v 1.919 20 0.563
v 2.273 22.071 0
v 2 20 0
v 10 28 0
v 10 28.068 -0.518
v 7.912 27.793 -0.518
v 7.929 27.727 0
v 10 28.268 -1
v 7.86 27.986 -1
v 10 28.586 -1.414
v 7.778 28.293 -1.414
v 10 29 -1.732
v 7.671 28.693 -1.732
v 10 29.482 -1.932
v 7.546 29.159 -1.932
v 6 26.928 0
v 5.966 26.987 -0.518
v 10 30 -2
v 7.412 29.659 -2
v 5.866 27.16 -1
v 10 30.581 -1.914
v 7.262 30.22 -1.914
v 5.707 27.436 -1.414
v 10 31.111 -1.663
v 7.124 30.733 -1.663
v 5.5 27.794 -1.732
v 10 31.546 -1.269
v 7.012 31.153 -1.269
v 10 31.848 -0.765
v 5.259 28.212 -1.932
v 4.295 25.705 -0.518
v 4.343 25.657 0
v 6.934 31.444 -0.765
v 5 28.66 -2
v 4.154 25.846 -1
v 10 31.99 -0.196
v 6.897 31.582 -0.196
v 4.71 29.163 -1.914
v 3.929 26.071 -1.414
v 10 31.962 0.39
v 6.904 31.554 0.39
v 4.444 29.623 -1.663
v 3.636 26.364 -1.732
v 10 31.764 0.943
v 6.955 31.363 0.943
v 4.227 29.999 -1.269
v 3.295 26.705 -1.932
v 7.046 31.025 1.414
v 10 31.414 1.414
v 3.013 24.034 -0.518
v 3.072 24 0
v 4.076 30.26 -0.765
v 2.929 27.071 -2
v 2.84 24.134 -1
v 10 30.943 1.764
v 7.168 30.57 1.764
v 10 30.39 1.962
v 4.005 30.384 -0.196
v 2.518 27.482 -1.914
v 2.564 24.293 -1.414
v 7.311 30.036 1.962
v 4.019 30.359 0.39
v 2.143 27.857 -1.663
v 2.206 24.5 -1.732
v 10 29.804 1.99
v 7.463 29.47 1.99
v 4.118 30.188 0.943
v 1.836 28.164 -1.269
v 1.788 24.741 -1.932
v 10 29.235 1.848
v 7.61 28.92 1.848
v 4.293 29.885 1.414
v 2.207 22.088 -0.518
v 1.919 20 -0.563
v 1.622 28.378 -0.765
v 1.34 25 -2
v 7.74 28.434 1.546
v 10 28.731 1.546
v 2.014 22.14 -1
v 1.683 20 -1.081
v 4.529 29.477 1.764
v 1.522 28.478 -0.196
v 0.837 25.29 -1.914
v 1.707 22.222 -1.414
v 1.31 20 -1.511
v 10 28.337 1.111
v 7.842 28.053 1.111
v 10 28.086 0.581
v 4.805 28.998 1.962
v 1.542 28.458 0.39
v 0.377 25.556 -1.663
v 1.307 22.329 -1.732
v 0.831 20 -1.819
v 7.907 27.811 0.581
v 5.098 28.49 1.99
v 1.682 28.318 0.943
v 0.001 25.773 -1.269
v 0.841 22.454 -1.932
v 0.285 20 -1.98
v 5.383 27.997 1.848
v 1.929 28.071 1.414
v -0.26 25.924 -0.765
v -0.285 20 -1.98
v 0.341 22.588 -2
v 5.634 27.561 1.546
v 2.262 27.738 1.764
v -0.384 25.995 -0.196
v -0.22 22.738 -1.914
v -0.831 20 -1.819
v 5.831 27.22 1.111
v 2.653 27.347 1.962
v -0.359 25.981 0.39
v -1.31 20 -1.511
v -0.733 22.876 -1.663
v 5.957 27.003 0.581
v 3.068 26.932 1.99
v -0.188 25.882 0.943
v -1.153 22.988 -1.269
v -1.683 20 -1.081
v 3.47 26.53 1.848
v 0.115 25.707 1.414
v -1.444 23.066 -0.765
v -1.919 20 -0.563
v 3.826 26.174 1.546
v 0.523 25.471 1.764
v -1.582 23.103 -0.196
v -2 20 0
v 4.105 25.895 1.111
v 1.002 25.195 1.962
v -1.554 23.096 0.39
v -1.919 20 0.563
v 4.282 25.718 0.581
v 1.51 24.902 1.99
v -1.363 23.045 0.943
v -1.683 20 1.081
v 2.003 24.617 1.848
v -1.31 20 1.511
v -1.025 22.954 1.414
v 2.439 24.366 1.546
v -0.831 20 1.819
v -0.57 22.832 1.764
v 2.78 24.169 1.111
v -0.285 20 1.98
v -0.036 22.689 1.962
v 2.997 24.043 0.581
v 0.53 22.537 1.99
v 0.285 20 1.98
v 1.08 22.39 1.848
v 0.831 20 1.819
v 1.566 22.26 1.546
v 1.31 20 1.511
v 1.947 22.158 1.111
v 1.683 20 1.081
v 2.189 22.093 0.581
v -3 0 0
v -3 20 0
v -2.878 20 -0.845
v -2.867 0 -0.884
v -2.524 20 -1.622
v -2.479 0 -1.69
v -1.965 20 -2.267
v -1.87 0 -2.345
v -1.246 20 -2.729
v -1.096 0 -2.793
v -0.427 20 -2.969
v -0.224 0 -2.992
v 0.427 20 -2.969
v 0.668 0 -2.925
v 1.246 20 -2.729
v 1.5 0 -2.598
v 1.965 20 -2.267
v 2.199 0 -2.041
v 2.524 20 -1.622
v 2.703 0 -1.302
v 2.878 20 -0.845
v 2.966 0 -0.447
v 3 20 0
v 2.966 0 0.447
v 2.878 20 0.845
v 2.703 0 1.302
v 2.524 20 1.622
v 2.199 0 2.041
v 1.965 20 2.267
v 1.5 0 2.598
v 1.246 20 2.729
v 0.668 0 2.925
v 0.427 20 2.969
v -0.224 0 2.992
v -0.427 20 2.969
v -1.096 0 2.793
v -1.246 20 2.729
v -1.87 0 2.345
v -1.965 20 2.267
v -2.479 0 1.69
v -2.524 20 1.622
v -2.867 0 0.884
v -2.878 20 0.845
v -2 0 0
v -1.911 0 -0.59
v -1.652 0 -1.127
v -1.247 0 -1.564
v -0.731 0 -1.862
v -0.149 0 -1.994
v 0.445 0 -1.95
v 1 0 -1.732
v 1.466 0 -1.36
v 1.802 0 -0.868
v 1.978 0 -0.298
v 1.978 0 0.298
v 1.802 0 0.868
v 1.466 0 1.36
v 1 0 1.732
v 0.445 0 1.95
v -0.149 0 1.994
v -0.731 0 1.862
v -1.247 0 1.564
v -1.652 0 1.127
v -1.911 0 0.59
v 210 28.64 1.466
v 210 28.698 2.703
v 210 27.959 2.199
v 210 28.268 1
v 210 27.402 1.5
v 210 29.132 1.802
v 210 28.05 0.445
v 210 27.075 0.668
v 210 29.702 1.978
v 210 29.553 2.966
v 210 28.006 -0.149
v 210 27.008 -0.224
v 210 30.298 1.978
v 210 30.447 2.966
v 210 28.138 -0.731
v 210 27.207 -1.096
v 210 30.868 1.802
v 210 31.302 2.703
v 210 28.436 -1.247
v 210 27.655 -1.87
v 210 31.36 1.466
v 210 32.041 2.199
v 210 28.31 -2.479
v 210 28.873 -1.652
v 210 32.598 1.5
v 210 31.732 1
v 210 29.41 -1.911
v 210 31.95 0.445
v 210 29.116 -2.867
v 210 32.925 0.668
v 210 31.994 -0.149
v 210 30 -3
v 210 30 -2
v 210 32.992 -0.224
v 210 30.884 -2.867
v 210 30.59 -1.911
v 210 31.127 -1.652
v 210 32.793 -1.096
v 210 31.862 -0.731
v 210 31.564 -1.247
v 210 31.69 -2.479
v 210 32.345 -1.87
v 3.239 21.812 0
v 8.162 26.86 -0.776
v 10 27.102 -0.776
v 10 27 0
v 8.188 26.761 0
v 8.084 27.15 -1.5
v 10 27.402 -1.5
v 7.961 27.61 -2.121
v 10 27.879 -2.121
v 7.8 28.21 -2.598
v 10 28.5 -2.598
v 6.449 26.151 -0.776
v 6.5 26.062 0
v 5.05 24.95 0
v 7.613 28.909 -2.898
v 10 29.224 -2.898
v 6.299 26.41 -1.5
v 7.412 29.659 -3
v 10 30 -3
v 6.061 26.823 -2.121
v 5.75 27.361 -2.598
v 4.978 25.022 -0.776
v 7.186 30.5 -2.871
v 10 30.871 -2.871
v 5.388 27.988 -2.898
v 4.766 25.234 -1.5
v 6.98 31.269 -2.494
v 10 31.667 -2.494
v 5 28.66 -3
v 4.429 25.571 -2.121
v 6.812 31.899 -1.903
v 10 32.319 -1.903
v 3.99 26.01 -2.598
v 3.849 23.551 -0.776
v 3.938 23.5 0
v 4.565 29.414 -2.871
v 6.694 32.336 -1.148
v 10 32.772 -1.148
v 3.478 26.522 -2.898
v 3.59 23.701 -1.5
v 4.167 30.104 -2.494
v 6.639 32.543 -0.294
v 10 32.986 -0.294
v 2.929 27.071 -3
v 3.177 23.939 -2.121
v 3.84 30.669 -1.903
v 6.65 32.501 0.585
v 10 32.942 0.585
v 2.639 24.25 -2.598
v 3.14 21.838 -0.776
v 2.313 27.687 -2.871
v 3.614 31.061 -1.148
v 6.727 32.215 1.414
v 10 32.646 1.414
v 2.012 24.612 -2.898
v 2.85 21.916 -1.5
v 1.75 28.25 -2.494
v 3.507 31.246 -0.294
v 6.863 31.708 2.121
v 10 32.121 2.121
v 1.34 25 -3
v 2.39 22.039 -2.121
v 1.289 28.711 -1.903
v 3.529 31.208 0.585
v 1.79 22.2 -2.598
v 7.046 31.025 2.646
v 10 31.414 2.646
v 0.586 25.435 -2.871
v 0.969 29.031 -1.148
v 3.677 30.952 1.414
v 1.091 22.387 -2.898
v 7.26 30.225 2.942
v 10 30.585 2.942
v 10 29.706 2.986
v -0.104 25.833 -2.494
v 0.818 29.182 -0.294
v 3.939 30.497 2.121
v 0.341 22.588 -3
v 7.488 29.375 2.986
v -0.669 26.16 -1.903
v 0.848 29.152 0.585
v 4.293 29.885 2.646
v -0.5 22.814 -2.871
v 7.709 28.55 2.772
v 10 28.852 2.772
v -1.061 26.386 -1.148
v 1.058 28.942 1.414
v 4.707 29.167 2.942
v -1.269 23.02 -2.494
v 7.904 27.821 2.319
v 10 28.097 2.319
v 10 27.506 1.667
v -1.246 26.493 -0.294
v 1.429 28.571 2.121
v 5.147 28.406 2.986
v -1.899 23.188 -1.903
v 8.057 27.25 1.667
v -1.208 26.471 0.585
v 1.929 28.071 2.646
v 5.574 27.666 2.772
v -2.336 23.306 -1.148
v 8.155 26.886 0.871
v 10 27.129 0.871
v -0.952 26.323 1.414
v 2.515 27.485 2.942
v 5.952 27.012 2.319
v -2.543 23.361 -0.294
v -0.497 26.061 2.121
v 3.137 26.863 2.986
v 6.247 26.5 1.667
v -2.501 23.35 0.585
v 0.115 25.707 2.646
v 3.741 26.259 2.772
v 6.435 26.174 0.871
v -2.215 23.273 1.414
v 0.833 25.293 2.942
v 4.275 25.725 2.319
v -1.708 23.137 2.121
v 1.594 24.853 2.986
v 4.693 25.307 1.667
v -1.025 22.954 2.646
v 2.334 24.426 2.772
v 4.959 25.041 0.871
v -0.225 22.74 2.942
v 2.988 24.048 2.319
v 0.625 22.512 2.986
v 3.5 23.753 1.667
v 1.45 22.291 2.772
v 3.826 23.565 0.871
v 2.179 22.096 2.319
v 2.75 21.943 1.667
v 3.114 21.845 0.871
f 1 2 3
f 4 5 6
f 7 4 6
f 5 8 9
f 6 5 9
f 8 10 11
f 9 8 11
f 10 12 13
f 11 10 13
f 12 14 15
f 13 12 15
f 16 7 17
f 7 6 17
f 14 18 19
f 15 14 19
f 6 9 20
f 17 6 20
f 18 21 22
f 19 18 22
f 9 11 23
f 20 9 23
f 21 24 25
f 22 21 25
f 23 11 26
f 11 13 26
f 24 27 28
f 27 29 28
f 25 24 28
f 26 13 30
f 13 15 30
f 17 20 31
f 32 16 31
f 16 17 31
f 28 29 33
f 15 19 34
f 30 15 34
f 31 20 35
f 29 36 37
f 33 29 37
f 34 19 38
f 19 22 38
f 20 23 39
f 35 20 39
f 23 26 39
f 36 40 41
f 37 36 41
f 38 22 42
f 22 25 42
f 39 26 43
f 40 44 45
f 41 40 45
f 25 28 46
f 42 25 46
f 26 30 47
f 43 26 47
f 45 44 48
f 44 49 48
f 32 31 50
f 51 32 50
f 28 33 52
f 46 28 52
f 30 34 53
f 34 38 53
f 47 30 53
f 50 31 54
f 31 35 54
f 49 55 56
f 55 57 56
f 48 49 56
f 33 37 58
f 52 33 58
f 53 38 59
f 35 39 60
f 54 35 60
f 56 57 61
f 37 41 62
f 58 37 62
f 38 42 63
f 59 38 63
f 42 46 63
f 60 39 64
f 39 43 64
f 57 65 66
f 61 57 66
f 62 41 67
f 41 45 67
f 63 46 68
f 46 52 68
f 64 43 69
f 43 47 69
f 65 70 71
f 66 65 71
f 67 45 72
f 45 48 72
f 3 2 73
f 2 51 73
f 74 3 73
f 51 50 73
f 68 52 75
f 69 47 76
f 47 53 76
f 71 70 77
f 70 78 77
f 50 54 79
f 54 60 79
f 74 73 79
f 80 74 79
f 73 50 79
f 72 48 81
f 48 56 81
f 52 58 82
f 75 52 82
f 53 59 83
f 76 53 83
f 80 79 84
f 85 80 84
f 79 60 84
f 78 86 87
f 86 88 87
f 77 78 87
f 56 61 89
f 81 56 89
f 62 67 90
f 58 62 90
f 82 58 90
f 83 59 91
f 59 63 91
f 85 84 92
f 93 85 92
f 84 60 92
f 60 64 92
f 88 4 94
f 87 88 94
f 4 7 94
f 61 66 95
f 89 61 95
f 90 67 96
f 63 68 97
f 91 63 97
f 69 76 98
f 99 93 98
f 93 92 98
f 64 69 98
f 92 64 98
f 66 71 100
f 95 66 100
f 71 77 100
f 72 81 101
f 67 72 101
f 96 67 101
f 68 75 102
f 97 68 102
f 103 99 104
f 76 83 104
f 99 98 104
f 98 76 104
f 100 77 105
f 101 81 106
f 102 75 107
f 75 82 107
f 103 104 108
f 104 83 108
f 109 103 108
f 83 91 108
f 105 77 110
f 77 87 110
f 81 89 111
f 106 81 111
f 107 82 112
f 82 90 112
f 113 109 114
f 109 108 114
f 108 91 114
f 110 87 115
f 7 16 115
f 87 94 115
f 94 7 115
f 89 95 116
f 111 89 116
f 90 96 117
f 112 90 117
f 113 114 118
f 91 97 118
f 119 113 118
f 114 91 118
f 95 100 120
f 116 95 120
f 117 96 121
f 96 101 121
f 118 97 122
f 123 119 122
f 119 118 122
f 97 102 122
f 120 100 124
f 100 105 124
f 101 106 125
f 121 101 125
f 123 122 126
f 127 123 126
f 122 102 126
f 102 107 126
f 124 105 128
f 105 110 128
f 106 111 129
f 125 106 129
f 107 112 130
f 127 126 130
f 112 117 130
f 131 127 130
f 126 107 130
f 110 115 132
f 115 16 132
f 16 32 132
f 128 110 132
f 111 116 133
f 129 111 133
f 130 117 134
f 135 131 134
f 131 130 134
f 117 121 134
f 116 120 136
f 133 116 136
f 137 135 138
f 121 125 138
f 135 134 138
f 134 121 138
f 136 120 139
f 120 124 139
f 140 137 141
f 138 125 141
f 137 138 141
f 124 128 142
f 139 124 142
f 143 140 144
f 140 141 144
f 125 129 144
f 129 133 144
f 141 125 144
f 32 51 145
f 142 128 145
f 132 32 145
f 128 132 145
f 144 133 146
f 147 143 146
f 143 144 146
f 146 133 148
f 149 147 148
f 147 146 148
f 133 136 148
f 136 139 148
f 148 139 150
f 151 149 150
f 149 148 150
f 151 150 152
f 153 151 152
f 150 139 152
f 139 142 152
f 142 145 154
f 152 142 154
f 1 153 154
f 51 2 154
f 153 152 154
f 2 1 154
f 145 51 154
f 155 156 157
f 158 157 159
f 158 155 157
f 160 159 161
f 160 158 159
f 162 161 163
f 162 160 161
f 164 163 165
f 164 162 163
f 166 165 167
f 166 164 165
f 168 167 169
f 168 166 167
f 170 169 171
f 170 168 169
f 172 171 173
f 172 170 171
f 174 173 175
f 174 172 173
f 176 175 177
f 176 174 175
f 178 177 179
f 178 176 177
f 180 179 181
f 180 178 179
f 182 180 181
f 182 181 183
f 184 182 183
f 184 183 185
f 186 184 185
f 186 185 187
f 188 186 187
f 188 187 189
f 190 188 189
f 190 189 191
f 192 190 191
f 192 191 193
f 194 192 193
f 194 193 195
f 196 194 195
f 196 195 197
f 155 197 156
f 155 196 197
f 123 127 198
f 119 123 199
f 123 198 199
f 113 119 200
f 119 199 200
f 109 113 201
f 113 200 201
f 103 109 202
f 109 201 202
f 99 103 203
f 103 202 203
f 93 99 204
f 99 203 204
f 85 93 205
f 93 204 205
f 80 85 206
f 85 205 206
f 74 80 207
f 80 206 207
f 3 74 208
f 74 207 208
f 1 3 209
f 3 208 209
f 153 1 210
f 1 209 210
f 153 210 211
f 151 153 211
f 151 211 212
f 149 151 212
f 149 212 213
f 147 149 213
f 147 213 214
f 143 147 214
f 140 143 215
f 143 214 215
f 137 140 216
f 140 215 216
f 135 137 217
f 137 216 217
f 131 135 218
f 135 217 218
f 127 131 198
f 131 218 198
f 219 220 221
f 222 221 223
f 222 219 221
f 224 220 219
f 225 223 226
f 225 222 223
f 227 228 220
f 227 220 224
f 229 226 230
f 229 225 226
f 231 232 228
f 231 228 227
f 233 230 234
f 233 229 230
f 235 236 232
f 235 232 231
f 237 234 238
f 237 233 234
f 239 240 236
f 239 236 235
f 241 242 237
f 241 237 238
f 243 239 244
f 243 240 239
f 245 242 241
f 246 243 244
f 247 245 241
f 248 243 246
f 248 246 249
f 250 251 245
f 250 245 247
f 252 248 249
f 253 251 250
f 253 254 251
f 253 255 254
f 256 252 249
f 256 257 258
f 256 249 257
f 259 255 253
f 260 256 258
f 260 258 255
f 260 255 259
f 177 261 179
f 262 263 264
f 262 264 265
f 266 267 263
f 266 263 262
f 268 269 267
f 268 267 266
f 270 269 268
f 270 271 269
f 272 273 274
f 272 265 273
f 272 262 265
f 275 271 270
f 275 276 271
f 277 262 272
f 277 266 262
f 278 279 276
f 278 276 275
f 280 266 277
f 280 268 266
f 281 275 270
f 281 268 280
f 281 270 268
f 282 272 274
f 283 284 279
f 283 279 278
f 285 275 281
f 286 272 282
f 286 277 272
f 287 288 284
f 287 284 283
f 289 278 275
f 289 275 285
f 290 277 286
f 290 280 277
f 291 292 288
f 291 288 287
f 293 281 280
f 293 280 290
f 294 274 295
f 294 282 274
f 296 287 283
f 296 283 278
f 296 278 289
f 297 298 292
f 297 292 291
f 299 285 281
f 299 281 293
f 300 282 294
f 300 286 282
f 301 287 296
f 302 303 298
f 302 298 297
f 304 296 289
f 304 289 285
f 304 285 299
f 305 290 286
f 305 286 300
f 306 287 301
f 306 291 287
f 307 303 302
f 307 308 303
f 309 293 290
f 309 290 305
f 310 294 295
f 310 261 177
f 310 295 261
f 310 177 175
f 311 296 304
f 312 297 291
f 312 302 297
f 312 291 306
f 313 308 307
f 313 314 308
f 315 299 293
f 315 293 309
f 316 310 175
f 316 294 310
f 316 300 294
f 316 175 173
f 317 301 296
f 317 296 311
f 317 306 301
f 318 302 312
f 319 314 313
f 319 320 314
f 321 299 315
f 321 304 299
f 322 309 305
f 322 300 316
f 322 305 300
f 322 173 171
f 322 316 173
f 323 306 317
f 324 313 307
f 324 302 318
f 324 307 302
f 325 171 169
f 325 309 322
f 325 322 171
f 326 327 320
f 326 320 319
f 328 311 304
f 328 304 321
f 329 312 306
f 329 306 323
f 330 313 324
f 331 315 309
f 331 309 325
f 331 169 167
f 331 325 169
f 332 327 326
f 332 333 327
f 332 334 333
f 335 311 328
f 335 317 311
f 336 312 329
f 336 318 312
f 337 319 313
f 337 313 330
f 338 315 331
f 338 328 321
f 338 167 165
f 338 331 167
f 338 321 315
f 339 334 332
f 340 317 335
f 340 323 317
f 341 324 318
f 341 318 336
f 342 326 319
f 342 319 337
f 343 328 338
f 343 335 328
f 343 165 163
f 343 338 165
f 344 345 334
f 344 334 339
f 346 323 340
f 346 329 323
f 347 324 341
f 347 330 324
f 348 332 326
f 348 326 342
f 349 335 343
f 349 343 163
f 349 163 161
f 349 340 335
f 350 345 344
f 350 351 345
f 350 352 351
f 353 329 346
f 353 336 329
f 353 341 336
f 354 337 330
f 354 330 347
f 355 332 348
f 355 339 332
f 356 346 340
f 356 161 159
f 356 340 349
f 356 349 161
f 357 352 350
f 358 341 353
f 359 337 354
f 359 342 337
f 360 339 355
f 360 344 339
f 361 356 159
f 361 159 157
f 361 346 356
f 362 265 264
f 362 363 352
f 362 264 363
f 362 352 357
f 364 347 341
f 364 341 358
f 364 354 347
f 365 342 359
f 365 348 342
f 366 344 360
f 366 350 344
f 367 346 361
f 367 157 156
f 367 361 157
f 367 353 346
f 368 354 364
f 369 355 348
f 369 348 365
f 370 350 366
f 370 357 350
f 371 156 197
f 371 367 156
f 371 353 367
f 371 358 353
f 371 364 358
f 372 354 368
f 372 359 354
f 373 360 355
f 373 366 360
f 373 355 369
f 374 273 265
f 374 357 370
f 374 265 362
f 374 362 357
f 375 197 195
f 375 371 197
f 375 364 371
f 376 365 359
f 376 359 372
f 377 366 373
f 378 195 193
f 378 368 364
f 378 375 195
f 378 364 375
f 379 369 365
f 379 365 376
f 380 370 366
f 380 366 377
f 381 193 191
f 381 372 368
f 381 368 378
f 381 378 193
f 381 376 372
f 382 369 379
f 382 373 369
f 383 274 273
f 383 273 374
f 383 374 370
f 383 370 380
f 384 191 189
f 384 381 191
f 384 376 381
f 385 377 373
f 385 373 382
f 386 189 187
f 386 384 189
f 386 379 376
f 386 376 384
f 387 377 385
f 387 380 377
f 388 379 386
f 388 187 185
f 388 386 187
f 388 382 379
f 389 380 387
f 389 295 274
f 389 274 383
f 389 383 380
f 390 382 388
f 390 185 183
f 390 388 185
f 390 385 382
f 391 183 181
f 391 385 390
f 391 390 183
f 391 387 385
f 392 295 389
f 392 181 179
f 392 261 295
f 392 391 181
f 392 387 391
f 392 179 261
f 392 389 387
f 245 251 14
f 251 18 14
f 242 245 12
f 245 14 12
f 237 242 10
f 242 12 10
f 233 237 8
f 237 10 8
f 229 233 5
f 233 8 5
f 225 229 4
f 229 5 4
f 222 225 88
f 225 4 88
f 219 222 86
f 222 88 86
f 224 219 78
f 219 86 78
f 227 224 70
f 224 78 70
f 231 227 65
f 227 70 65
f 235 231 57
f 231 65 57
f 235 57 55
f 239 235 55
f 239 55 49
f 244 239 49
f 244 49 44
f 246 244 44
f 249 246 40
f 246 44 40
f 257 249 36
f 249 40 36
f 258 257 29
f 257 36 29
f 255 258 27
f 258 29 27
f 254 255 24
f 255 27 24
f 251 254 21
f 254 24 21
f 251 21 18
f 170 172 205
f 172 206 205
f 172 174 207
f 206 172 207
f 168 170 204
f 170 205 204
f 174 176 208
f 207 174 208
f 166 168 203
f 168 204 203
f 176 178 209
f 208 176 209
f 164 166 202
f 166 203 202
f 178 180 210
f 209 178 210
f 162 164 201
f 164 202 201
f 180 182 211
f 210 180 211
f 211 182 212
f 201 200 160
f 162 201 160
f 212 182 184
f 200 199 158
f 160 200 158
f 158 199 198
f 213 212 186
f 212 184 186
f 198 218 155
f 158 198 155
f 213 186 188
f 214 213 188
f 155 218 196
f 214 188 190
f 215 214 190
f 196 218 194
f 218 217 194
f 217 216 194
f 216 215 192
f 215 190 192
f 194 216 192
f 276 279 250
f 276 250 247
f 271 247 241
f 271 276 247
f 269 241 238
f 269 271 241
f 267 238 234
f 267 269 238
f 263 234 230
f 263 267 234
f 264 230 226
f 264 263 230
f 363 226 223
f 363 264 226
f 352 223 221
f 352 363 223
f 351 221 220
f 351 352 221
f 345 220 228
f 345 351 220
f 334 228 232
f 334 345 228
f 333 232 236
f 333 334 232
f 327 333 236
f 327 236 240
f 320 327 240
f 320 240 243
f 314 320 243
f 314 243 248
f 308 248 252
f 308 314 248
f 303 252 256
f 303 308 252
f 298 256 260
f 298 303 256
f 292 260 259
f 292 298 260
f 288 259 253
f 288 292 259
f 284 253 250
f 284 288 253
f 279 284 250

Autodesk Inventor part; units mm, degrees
ref_plane "YZ Plane" through (0, 0, 0) normal (1, 0, 0) x (0, 1, 0)
ref_plane "XZ Plane" through (0, 0, 0) normal (0, 1, 0) x (-1, 0, 0)
ref_plane "XY Plane" through (0, 0, 0) normal (0, 0, 1) x (1, 0, 0)
sketch "Sketch1" plane through (0, 0, 0) normal (0, 1, 0) x (-1, 0, 0)
  circle A0 centre (0, 0) radius 2
  circle A1 centre (0, 0) radius 3
  dimension "d0" = 4
  dimension "d1" = 6
extrude "Extrusion1" add sketch "Sketch1" along normal blind 20
sketch "Sketch2" plane through (0, 20, 0) normal (0, 1, 0) x (1, 0, 0)
  circle A0 centre (0, 0) radius 3 projected
  circle A1 centre (0, 0) radius 2 projected
  line L0 (10, -5) -> (10, 5)
  dimension "d4" = 10
  dimension "d5" = 5
  dimension "d6" = 10
revolve "Revolution1" add sketch "Sketch2" angle 90 about axis through (10, 20, 5) along (0, 0, -1)
sketch "Sketch3" plane through (10, 30, 0) normal (1, 0, 0) x (0, 0, -1)
  circle A0 centre (0, 0) radius 3 projected
  circle A1 centre (0, 0) radius 2 projected
  point P0 (0, -30)
extrude "Extrusion2" add sketch "Sketch3" along normal blind 200
properties part number "Pipe"
